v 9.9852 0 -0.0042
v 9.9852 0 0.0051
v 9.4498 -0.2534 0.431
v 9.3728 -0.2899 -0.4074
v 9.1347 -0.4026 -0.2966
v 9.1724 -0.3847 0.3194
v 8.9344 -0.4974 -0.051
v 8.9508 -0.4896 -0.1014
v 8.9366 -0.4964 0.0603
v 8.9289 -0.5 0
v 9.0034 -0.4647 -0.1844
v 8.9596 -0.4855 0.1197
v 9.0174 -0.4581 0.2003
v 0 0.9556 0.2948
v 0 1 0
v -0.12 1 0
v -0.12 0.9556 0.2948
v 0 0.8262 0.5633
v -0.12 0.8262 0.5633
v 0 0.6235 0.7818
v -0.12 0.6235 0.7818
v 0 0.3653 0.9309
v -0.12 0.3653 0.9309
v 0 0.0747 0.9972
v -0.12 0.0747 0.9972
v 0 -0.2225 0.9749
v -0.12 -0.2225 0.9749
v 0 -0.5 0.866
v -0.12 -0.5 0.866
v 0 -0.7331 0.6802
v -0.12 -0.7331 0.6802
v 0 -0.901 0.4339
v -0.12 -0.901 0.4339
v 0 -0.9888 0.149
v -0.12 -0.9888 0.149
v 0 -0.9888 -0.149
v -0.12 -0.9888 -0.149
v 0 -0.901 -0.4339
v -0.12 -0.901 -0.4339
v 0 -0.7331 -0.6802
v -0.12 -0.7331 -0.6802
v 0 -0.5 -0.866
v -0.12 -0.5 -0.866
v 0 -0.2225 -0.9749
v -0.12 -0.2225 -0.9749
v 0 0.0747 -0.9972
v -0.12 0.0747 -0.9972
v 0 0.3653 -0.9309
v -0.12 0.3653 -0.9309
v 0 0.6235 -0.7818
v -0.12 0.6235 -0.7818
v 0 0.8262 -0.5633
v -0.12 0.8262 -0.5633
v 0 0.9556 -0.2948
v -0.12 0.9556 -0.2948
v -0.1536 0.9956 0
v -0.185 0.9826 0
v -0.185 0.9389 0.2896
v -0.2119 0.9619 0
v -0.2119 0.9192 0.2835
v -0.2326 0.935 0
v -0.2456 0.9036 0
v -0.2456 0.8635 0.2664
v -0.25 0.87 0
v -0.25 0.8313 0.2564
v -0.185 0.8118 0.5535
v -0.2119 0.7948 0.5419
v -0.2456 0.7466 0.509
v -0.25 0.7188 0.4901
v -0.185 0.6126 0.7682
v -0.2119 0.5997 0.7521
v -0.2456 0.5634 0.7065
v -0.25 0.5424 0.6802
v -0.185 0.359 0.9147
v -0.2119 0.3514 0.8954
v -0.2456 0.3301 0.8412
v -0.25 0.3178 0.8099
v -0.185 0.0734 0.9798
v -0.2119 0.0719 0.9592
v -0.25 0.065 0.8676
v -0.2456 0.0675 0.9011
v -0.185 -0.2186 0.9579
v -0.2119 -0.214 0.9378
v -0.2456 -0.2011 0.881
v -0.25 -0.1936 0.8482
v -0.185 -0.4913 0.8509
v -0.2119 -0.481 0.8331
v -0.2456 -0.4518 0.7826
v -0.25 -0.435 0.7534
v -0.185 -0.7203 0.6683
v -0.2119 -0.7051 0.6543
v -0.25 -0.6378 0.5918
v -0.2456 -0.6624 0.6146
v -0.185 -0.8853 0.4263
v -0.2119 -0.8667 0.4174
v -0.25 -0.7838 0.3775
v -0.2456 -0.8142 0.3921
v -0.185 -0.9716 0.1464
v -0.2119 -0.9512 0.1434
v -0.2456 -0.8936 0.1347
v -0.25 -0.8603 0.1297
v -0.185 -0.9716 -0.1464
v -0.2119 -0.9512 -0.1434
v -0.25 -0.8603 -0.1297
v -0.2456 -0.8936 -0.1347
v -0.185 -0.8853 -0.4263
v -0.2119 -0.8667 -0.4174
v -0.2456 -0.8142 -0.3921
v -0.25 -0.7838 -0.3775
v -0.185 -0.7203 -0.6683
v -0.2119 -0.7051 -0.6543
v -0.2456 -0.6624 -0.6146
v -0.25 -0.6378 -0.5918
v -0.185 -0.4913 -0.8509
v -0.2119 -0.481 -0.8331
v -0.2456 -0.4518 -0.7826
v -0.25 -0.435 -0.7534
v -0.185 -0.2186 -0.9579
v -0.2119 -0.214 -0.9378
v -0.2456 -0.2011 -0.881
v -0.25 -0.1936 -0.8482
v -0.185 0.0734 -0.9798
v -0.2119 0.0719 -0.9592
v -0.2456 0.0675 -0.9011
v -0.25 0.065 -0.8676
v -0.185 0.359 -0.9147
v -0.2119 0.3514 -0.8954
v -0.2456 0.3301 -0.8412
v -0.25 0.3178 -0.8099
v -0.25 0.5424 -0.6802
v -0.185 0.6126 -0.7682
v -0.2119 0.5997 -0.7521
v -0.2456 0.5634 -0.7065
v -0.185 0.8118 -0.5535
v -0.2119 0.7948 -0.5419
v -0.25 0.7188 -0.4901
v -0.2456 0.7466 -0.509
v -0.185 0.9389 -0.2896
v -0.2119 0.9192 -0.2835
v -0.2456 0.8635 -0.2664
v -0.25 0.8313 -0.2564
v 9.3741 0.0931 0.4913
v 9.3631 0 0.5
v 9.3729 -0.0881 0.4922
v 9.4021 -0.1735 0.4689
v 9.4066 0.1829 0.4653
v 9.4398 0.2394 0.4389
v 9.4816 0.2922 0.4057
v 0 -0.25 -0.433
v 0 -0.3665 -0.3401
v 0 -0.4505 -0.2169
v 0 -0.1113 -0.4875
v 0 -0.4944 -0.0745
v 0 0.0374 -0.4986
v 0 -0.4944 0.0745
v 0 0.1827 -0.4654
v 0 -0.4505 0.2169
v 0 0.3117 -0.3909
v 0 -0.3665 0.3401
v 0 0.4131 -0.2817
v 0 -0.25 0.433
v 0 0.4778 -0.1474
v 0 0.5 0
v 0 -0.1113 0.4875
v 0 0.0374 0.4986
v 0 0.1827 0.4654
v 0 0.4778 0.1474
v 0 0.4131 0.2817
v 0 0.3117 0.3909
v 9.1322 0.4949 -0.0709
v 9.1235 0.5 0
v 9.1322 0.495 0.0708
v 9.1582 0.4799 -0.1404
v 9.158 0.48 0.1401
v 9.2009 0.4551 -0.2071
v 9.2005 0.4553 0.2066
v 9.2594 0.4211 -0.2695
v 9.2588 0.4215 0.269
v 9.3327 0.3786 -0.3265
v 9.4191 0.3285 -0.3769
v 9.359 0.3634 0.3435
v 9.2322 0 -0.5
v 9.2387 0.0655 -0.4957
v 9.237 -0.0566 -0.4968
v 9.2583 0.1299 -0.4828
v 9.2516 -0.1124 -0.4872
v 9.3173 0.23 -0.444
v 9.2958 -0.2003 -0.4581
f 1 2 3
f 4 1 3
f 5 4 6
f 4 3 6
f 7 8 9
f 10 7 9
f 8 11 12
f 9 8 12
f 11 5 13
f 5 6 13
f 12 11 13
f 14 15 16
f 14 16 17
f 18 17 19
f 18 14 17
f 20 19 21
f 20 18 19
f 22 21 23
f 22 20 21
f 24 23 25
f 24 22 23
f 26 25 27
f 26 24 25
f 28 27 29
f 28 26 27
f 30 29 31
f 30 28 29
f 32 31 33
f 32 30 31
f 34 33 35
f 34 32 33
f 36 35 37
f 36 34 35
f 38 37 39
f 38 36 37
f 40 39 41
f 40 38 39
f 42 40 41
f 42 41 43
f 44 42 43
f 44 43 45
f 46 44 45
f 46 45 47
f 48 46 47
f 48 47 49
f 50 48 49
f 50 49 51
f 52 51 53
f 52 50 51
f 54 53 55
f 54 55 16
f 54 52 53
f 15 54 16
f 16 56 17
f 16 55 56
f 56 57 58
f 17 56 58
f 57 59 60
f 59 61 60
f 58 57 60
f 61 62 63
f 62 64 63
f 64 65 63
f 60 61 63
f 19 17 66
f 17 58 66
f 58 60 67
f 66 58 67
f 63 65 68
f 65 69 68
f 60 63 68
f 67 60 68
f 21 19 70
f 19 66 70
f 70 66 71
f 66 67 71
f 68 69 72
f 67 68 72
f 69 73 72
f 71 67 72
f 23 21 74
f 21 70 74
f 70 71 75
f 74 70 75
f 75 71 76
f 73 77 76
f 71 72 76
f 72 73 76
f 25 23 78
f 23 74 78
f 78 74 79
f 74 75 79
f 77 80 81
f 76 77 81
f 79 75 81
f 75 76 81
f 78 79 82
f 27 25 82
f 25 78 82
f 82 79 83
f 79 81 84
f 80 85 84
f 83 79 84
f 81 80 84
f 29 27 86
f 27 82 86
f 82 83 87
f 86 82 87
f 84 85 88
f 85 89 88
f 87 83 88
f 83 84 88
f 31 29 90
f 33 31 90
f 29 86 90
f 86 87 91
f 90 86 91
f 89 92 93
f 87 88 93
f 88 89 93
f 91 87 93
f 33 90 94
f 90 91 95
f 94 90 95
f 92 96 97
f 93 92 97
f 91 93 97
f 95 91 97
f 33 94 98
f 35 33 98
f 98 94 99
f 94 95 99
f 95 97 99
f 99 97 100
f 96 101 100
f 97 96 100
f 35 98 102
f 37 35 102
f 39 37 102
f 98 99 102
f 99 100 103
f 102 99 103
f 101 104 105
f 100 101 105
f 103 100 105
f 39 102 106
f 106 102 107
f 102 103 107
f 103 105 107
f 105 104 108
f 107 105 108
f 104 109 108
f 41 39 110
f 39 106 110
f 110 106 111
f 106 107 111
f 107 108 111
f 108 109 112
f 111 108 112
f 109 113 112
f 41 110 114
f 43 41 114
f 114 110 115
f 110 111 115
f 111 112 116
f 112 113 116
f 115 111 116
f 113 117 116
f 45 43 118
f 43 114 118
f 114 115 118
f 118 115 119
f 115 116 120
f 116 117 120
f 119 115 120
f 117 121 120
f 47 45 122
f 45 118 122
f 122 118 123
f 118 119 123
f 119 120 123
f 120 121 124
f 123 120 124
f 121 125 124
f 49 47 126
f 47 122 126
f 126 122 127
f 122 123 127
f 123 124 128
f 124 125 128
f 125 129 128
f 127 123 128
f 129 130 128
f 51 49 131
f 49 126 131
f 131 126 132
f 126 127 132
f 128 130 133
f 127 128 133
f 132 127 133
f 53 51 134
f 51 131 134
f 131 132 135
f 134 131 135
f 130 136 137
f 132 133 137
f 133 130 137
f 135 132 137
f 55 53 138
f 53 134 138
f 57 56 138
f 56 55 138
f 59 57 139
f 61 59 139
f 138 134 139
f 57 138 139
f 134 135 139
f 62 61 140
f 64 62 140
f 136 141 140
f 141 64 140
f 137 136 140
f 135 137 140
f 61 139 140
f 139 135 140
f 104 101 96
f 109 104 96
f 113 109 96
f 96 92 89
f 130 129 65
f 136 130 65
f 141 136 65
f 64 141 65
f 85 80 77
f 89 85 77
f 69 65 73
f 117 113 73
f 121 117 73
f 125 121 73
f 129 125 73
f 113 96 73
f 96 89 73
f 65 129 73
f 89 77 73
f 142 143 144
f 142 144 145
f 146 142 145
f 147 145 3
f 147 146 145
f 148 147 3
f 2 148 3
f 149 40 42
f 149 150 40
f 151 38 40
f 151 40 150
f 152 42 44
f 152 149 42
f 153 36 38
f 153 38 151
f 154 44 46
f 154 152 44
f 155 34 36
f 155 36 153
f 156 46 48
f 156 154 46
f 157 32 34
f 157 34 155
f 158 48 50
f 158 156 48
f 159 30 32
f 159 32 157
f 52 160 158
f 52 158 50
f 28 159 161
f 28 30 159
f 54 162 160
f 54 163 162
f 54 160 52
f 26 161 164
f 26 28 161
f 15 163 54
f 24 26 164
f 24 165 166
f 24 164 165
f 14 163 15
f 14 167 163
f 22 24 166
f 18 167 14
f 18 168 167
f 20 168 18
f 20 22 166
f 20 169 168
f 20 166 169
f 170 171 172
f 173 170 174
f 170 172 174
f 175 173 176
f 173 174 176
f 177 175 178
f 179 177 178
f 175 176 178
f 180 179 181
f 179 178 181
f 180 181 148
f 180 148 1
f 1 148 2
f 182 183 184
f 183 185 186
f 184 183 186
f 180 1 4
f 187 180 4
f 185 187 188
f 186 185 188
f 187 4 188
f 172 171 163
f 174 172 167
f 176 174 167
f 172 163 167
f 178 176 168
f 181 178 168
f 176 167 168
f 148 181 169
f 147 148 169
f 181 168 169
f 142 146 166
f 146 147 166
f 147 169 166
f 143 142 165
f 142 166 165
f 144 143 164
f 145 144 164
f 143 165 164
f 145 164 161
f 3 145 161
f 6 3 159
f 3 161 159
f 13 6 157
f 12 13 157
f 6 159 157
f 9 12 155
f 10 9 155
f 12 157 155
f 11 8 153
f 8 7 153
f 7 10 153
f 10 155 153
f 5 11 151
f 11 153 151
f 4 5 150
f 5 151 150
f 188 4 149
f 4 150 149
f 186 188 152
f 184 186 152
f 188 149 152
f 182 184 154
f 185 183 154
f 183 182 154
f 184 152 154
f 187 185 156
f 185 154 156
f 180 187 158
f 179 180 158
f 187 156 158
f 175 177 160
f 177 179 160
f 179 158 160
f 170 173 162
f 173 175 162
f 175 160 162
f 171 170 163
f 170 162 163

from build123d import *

# Parameters (mm, degrees)
F0_R          = 0.5
F1_DEPTH      = 10
F0_R_2        = 1
F2_DEPTH      = 0.25
F3_R          = 0.13
F5_DEPTH      = 25
F5_DEPTH_BACK = 25
F7_DEPTH      = 25
F7_DEPTH_BACK = 25


with BuildPart() as f1:
    # F0 (on Right) → F1 (new body)
    with BuildSketch(Plane.YZ):
        Circle(F0_R)
    extrude(amount=F1_DEPTH)

    # F0 (on Right) → F2 (join)
    with BuildSketch(Plane.YZ):
        Circle(F0_R_2)
        Circle(F0_R, mode=Mode.SUBTRACT)
        Circle(F0_R)
    extrude(amount=-F2_DEPTH)

    # F3
    f3_edges = [f1.edges().sort_by_distance(p)[0] for p in [
        (-0.25, -1, 0),
    ]]
    fillet(f3_edges, radius=F3_R)

    # F4 (on Front) → F5 (cut, two sides)
    with BuildSketch(Plane.XZ) as f5_sk:
        Polygon((9.2973364517, 1.1940489057), (9.0074734762, 0.7828483358), (9.9916588515, 0), (8.8052442297, -0.7810618845), (10.7196858153, -0.7540978841), (10.7331676409, 1.3423507335), align=None)
    extrude(amount=-F5_DEPTH, mode=Mode.SUBTRACT)
    extrude(f5_sk.sketch, amount=F5_DEPTH_BACK, mode=Mode.SUBTRACT)

    # F6 (on Top) → F7 (cut, two sides)
    with BuildSketch(Plane.XY) as f7_sk:
        Polygon((9.9852262065, 0), (8.3366055042, -0.7803390617), (11.1771607772, -1.2145728106), (11.2198108528, 0.6940264138), (8.7891332805, 0.6940264138), align=None)
    extrude(amount=F7_DEPTH, mode=Mode.SUBTRACT)
    extrude(f7_sk.sketch, amount=-F7_DEPTH_BACK, mode=Mode.SUBTRACT)


solid = f1.part
